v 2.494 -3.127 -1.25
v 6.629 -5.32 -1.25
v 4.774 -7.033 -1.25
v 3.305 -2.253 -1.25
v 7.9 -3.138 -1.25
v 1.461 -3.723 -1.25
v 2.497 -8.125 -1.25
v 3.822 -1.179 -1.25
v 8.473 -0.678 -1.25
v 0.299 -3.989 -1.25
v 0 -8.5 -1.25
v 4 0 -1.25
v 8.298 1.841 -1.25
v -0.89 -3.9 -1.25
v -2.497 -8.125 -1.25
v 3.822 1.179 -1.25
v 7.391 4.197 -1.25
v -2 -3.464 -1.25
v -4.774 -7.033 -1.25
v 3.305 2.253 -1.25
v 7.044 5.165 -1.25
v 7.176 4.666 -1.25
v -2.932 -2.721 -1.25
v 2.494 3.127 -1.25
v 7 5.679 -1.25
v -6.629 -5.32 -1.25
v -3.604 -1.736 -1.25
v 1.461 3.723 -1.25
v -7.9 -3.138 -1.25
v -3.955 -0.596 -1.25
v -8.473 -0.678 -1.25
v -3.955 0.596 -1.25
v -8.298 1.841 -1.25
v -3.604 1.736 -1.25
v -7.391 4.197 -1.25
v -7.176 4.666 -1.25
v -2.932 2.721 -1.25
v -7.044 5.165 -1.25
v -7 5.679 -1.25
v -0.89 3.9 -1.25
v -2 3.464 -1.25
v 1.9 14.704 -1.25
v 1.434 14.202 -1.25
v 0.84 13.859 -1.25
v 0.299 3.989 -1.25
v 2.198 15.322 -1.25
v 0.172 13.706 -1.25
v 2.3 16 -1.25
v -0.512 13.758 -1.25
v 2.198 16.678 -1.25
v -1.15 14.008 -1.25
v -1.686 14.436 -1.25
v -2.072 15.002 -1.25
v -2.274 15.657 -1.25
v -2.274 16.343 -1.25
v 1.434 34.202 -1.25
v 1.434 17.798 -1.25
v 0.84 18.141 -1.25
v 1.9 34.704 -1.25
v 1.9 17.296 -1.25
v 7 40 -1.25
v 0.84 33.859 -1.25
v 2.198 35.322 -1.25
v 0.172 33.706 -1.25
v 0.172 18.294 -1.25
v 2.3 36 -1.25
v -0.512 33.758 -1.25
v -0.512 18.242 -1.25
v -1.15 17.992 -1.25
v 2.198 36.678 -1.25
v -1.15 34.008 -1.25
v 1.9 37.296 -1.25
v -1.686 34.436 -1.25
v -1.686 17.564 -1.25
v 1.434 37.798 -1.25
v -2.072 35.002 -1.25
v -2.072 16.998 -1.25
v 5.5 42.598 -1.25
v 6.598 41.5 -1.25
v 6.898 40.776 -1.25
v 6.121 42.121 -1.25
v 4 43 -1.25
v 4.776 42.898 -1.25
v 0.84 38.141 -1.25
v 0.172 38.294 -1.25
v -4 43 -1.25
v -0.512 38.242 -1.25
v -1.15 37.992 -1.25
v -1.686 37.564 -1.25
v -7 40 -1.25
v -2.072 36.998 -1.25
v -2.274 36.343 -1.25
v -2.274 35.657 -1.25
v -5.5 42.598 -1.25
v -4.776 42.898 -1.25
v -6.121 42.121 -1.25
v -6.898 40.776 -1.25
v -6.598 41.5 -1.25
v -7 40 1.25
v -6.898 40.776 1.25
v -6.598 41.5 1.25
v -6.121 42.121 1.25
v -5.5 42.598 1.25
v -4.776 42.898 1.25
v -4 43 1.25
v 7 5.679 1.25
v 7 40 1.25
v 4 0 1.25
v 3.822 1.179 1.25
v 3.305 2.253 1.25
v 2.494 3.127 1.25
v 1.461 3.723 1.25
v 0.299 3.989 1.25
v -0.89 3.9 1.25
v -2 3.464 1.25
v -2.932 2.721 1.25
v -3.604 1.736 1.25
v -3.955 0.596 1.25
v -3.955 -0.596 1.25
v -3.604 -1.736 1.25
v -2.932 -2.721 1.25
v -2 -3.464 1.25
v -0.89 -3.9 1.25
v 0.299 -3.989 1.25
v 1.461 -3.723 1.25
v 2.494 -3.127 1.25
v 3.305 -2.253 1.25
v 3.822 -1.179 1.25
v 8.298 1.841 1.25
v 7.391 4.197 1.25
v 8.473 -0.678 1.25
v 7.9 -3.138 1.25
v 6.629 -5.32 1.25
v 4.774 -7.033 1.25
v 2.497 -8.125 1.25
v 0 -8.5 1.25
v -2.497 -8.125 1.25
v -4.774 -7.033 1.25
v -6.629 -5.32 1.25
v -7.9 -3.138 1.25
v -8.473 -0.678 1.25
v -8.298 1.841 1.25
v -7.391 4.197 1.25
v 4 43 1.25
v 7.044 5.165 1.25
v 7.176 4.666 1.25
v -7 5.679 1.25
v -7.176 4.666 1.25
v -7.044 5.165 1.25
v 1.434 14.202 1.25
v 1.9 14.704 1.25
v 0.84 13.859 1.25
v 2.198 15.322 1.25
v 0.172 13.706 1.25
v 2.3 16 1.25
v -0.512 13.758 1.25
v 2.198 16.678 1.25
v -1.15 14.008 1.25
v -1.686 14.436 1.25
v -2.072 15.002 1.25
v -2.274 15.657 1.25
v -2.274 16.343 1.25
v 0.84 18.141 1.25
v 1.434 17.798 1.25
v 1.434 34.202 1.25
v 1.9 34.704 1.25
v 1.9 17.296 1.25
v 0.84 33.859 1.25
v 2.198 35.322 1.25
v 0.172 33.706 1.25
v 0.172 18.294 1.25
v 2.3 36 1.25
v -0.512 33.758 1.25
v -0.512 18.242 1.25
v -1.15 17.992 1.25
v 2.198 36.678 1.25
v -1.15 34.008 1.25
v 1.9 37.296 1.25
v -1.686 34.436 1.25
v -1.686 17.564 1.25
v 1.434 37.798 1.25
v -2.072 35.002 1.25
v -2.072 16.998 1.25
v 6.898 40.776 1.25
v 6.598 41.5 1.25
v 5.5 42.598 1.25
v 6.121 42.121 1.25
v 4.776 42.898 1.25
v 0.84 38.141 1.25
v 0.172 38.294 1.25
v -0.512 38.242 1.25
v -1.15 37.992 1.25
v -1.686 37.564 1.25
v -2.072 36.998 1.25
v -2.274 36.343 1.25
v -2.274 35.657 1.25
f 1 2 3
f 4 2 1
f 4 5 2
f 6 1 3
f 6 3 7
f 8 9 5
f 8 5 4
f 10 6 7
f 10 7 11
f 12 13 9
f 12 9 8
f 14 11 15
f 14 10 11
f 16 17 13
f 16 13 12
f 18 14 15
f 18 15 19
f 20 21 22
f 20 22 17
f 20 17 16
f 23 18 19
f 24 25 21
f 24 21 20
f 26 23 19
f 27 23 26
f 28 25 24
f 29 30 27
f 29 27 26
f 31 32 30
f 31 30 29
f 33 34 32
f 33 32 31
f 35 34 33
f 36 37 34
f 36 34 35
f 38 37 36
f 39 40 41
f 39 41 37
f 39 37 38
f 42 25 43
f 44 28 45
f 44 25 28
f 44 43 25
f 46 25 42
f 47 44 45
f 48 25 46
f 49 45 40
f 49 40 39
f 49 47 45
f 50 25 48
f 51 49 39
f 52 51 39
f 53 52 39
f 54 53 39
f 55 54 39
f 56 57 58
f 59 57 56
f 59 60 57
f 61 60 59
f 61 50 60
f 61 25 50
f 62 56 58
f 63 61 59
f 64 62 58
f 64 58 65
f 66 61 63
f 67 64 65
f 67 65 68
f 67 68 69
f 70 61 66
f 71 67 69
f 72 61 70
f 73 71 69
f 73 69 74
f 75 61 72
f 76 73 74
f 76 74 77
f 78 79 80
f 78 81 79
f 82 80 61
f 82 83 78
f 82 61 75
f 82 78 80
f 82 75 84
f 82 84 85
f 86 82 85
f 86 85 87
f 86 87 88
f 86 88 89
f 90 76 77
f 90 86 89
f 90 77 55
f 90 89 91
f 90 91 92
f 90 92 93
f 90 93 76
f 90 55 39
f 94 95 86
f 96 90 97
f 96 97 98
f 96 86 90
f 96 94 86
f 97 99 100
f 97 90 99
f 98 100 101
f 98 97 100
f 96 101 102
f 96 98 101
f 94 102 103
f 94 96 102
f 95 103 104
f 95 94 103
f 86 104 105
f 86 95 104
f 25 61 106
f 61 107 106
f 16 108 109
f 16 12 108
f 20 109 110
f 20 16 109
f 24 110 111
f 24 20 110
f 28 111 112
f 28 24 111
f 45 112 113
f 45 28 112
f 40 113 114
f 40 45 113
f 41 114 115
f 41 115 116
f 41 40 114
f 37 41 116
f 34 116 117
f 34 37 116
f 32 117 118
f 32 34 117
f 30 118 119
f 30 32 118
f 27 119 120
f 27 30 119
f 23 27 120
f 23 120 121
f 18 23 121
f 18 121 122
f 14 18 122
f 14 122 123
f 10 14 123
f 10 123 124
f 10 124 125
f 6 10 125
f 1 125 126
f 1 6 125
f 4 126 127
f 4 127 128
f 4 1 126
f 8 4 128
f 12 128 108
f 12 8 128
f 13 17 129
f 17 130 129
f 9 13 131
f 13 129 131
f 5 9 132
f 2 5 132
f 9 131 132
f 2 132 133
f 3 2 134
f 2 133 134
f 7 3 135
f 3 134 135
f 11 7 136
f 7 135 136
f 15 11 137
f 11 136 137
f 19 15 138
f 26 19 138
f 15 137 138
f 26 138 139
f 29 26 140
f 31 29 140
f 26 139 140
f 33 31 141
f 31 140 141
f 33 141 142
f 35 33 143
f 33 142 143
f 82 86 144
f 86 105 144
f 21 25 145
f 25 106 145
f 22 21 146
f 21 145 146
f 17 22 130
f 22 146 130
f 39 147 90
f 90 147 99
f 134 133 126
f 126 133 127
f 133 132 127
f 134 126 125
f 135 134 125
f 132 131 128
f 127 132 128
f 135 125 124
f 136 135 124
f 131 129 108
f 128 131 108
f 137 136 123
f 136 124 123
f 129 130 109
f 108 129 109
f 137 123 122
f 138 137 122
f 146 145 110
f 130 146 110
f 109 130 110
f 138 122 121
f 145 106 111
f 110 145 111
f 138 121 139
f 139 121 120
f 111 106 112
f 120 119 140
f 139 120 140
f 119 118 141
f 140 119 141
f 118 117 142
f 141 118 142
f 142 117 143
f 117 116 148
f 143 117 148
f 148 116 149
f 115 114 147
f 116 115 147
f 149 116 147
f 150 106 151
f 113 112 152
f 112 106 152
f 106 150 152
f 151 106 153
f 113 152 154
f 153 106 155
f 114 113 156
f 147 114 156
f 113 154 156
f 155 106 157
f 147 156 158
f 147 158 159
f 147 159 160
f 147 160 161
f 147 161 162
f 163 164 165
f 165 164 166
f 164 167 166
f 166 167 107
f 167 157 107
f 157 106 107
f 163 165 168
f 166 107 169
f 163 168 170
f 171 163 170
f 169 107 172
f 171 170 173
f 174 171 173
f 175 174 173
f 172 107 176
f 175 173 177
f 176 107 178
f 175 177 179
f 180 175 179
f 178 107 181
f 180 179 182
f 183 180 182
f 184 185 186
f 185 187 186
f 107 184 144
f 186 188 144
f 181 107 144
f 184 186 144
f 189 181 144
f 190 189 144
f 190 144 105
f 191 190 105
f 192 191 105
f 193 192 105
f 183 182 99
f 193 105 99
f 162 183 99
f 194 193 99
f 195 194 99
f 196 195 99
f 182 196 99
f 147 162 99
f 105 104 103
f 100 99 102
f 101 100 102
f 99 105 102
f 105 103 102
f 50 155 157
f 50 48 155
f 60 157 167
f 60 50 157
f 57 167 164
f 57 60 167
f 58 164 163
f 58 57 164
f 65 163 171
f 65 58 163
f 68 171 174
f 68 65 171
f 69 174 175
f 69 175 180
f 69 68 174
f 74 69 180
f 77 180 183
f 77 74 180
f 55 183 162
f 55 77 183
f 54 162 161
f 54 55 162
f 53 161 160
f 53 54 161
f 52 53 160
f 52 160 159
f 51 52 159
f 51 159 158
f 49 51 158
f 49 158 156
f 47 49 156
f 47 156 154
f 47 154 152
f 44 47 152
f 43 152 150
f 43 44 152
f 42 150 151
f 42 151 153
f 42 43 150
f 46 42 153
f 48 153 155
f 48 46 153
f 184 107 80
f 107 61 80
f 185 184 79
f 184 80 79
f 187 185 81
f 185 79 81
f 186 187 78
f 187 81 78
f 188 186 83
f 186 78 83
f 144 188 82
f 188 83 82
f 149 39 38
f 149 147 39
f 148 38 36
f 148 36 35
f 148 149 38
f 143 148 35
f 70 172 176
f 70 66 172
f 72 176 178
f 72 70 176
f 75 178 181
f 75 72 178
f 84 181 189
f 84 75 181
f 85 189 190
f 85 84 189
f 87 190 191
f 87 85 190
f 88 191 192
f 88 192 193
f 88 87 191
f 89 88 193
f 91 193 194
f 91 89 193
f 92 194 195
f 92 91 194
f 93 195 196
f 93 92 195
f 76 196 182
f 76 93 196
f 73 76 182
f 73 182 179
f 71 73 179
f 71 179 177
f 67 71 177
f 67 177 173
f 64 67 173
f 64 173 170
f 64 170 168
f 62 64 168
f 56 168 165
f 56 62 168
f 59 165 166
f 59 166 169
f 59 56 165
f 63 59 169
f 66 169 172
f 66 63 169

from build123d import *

# Parameters (mm, degrees)
SKETCH_1_R      = 4
SKETCH_1_R_2    = 2.3
EXTRUDE_1_DEPTH = 1.25
FILLET_1_R      = 3


with BuildPart() as part:
    # 草图1 → 凸台-拉伸1 (new, symmetric)
    with BuildSketch(Plane.XY):
        with BuildLine():
            Line((-7, 4.82182538), (-7, 43))
            Line((-7, 43), (7, 43))
            Line((7, 43), (7, 4.82182538))
            ThreePointArc((7, 4.82182538), (0, -8.5), (-7, 4.82182538))
        make_face()
        Circle(SKETCH_1_R, mode=Mode.SUBTRACT)
        with Locations((0, 36)):
            Circle(SKETCH_1_R_2, mode=Mode.SUBTRACT)
        with Locations((0, 16)):
            Circle(SKETCH_1_R_2, mode=Mode.SUBTRACT)
    extrude(amount=EXTRUDE_1_DEPTH, both=True)

    # 圆角1
    fillet_1_edges = [part.edges().sort_by_distance(p)[0] for p in [
        (-7, 4.82182538, 0),
        (-7, 43, 0),
        (7, 43, 0),
        (7, 4.82182538, 0),
    ]]
    fillet(fillet_1_edges, radius=FILLET_1_R)


solid = part.part
